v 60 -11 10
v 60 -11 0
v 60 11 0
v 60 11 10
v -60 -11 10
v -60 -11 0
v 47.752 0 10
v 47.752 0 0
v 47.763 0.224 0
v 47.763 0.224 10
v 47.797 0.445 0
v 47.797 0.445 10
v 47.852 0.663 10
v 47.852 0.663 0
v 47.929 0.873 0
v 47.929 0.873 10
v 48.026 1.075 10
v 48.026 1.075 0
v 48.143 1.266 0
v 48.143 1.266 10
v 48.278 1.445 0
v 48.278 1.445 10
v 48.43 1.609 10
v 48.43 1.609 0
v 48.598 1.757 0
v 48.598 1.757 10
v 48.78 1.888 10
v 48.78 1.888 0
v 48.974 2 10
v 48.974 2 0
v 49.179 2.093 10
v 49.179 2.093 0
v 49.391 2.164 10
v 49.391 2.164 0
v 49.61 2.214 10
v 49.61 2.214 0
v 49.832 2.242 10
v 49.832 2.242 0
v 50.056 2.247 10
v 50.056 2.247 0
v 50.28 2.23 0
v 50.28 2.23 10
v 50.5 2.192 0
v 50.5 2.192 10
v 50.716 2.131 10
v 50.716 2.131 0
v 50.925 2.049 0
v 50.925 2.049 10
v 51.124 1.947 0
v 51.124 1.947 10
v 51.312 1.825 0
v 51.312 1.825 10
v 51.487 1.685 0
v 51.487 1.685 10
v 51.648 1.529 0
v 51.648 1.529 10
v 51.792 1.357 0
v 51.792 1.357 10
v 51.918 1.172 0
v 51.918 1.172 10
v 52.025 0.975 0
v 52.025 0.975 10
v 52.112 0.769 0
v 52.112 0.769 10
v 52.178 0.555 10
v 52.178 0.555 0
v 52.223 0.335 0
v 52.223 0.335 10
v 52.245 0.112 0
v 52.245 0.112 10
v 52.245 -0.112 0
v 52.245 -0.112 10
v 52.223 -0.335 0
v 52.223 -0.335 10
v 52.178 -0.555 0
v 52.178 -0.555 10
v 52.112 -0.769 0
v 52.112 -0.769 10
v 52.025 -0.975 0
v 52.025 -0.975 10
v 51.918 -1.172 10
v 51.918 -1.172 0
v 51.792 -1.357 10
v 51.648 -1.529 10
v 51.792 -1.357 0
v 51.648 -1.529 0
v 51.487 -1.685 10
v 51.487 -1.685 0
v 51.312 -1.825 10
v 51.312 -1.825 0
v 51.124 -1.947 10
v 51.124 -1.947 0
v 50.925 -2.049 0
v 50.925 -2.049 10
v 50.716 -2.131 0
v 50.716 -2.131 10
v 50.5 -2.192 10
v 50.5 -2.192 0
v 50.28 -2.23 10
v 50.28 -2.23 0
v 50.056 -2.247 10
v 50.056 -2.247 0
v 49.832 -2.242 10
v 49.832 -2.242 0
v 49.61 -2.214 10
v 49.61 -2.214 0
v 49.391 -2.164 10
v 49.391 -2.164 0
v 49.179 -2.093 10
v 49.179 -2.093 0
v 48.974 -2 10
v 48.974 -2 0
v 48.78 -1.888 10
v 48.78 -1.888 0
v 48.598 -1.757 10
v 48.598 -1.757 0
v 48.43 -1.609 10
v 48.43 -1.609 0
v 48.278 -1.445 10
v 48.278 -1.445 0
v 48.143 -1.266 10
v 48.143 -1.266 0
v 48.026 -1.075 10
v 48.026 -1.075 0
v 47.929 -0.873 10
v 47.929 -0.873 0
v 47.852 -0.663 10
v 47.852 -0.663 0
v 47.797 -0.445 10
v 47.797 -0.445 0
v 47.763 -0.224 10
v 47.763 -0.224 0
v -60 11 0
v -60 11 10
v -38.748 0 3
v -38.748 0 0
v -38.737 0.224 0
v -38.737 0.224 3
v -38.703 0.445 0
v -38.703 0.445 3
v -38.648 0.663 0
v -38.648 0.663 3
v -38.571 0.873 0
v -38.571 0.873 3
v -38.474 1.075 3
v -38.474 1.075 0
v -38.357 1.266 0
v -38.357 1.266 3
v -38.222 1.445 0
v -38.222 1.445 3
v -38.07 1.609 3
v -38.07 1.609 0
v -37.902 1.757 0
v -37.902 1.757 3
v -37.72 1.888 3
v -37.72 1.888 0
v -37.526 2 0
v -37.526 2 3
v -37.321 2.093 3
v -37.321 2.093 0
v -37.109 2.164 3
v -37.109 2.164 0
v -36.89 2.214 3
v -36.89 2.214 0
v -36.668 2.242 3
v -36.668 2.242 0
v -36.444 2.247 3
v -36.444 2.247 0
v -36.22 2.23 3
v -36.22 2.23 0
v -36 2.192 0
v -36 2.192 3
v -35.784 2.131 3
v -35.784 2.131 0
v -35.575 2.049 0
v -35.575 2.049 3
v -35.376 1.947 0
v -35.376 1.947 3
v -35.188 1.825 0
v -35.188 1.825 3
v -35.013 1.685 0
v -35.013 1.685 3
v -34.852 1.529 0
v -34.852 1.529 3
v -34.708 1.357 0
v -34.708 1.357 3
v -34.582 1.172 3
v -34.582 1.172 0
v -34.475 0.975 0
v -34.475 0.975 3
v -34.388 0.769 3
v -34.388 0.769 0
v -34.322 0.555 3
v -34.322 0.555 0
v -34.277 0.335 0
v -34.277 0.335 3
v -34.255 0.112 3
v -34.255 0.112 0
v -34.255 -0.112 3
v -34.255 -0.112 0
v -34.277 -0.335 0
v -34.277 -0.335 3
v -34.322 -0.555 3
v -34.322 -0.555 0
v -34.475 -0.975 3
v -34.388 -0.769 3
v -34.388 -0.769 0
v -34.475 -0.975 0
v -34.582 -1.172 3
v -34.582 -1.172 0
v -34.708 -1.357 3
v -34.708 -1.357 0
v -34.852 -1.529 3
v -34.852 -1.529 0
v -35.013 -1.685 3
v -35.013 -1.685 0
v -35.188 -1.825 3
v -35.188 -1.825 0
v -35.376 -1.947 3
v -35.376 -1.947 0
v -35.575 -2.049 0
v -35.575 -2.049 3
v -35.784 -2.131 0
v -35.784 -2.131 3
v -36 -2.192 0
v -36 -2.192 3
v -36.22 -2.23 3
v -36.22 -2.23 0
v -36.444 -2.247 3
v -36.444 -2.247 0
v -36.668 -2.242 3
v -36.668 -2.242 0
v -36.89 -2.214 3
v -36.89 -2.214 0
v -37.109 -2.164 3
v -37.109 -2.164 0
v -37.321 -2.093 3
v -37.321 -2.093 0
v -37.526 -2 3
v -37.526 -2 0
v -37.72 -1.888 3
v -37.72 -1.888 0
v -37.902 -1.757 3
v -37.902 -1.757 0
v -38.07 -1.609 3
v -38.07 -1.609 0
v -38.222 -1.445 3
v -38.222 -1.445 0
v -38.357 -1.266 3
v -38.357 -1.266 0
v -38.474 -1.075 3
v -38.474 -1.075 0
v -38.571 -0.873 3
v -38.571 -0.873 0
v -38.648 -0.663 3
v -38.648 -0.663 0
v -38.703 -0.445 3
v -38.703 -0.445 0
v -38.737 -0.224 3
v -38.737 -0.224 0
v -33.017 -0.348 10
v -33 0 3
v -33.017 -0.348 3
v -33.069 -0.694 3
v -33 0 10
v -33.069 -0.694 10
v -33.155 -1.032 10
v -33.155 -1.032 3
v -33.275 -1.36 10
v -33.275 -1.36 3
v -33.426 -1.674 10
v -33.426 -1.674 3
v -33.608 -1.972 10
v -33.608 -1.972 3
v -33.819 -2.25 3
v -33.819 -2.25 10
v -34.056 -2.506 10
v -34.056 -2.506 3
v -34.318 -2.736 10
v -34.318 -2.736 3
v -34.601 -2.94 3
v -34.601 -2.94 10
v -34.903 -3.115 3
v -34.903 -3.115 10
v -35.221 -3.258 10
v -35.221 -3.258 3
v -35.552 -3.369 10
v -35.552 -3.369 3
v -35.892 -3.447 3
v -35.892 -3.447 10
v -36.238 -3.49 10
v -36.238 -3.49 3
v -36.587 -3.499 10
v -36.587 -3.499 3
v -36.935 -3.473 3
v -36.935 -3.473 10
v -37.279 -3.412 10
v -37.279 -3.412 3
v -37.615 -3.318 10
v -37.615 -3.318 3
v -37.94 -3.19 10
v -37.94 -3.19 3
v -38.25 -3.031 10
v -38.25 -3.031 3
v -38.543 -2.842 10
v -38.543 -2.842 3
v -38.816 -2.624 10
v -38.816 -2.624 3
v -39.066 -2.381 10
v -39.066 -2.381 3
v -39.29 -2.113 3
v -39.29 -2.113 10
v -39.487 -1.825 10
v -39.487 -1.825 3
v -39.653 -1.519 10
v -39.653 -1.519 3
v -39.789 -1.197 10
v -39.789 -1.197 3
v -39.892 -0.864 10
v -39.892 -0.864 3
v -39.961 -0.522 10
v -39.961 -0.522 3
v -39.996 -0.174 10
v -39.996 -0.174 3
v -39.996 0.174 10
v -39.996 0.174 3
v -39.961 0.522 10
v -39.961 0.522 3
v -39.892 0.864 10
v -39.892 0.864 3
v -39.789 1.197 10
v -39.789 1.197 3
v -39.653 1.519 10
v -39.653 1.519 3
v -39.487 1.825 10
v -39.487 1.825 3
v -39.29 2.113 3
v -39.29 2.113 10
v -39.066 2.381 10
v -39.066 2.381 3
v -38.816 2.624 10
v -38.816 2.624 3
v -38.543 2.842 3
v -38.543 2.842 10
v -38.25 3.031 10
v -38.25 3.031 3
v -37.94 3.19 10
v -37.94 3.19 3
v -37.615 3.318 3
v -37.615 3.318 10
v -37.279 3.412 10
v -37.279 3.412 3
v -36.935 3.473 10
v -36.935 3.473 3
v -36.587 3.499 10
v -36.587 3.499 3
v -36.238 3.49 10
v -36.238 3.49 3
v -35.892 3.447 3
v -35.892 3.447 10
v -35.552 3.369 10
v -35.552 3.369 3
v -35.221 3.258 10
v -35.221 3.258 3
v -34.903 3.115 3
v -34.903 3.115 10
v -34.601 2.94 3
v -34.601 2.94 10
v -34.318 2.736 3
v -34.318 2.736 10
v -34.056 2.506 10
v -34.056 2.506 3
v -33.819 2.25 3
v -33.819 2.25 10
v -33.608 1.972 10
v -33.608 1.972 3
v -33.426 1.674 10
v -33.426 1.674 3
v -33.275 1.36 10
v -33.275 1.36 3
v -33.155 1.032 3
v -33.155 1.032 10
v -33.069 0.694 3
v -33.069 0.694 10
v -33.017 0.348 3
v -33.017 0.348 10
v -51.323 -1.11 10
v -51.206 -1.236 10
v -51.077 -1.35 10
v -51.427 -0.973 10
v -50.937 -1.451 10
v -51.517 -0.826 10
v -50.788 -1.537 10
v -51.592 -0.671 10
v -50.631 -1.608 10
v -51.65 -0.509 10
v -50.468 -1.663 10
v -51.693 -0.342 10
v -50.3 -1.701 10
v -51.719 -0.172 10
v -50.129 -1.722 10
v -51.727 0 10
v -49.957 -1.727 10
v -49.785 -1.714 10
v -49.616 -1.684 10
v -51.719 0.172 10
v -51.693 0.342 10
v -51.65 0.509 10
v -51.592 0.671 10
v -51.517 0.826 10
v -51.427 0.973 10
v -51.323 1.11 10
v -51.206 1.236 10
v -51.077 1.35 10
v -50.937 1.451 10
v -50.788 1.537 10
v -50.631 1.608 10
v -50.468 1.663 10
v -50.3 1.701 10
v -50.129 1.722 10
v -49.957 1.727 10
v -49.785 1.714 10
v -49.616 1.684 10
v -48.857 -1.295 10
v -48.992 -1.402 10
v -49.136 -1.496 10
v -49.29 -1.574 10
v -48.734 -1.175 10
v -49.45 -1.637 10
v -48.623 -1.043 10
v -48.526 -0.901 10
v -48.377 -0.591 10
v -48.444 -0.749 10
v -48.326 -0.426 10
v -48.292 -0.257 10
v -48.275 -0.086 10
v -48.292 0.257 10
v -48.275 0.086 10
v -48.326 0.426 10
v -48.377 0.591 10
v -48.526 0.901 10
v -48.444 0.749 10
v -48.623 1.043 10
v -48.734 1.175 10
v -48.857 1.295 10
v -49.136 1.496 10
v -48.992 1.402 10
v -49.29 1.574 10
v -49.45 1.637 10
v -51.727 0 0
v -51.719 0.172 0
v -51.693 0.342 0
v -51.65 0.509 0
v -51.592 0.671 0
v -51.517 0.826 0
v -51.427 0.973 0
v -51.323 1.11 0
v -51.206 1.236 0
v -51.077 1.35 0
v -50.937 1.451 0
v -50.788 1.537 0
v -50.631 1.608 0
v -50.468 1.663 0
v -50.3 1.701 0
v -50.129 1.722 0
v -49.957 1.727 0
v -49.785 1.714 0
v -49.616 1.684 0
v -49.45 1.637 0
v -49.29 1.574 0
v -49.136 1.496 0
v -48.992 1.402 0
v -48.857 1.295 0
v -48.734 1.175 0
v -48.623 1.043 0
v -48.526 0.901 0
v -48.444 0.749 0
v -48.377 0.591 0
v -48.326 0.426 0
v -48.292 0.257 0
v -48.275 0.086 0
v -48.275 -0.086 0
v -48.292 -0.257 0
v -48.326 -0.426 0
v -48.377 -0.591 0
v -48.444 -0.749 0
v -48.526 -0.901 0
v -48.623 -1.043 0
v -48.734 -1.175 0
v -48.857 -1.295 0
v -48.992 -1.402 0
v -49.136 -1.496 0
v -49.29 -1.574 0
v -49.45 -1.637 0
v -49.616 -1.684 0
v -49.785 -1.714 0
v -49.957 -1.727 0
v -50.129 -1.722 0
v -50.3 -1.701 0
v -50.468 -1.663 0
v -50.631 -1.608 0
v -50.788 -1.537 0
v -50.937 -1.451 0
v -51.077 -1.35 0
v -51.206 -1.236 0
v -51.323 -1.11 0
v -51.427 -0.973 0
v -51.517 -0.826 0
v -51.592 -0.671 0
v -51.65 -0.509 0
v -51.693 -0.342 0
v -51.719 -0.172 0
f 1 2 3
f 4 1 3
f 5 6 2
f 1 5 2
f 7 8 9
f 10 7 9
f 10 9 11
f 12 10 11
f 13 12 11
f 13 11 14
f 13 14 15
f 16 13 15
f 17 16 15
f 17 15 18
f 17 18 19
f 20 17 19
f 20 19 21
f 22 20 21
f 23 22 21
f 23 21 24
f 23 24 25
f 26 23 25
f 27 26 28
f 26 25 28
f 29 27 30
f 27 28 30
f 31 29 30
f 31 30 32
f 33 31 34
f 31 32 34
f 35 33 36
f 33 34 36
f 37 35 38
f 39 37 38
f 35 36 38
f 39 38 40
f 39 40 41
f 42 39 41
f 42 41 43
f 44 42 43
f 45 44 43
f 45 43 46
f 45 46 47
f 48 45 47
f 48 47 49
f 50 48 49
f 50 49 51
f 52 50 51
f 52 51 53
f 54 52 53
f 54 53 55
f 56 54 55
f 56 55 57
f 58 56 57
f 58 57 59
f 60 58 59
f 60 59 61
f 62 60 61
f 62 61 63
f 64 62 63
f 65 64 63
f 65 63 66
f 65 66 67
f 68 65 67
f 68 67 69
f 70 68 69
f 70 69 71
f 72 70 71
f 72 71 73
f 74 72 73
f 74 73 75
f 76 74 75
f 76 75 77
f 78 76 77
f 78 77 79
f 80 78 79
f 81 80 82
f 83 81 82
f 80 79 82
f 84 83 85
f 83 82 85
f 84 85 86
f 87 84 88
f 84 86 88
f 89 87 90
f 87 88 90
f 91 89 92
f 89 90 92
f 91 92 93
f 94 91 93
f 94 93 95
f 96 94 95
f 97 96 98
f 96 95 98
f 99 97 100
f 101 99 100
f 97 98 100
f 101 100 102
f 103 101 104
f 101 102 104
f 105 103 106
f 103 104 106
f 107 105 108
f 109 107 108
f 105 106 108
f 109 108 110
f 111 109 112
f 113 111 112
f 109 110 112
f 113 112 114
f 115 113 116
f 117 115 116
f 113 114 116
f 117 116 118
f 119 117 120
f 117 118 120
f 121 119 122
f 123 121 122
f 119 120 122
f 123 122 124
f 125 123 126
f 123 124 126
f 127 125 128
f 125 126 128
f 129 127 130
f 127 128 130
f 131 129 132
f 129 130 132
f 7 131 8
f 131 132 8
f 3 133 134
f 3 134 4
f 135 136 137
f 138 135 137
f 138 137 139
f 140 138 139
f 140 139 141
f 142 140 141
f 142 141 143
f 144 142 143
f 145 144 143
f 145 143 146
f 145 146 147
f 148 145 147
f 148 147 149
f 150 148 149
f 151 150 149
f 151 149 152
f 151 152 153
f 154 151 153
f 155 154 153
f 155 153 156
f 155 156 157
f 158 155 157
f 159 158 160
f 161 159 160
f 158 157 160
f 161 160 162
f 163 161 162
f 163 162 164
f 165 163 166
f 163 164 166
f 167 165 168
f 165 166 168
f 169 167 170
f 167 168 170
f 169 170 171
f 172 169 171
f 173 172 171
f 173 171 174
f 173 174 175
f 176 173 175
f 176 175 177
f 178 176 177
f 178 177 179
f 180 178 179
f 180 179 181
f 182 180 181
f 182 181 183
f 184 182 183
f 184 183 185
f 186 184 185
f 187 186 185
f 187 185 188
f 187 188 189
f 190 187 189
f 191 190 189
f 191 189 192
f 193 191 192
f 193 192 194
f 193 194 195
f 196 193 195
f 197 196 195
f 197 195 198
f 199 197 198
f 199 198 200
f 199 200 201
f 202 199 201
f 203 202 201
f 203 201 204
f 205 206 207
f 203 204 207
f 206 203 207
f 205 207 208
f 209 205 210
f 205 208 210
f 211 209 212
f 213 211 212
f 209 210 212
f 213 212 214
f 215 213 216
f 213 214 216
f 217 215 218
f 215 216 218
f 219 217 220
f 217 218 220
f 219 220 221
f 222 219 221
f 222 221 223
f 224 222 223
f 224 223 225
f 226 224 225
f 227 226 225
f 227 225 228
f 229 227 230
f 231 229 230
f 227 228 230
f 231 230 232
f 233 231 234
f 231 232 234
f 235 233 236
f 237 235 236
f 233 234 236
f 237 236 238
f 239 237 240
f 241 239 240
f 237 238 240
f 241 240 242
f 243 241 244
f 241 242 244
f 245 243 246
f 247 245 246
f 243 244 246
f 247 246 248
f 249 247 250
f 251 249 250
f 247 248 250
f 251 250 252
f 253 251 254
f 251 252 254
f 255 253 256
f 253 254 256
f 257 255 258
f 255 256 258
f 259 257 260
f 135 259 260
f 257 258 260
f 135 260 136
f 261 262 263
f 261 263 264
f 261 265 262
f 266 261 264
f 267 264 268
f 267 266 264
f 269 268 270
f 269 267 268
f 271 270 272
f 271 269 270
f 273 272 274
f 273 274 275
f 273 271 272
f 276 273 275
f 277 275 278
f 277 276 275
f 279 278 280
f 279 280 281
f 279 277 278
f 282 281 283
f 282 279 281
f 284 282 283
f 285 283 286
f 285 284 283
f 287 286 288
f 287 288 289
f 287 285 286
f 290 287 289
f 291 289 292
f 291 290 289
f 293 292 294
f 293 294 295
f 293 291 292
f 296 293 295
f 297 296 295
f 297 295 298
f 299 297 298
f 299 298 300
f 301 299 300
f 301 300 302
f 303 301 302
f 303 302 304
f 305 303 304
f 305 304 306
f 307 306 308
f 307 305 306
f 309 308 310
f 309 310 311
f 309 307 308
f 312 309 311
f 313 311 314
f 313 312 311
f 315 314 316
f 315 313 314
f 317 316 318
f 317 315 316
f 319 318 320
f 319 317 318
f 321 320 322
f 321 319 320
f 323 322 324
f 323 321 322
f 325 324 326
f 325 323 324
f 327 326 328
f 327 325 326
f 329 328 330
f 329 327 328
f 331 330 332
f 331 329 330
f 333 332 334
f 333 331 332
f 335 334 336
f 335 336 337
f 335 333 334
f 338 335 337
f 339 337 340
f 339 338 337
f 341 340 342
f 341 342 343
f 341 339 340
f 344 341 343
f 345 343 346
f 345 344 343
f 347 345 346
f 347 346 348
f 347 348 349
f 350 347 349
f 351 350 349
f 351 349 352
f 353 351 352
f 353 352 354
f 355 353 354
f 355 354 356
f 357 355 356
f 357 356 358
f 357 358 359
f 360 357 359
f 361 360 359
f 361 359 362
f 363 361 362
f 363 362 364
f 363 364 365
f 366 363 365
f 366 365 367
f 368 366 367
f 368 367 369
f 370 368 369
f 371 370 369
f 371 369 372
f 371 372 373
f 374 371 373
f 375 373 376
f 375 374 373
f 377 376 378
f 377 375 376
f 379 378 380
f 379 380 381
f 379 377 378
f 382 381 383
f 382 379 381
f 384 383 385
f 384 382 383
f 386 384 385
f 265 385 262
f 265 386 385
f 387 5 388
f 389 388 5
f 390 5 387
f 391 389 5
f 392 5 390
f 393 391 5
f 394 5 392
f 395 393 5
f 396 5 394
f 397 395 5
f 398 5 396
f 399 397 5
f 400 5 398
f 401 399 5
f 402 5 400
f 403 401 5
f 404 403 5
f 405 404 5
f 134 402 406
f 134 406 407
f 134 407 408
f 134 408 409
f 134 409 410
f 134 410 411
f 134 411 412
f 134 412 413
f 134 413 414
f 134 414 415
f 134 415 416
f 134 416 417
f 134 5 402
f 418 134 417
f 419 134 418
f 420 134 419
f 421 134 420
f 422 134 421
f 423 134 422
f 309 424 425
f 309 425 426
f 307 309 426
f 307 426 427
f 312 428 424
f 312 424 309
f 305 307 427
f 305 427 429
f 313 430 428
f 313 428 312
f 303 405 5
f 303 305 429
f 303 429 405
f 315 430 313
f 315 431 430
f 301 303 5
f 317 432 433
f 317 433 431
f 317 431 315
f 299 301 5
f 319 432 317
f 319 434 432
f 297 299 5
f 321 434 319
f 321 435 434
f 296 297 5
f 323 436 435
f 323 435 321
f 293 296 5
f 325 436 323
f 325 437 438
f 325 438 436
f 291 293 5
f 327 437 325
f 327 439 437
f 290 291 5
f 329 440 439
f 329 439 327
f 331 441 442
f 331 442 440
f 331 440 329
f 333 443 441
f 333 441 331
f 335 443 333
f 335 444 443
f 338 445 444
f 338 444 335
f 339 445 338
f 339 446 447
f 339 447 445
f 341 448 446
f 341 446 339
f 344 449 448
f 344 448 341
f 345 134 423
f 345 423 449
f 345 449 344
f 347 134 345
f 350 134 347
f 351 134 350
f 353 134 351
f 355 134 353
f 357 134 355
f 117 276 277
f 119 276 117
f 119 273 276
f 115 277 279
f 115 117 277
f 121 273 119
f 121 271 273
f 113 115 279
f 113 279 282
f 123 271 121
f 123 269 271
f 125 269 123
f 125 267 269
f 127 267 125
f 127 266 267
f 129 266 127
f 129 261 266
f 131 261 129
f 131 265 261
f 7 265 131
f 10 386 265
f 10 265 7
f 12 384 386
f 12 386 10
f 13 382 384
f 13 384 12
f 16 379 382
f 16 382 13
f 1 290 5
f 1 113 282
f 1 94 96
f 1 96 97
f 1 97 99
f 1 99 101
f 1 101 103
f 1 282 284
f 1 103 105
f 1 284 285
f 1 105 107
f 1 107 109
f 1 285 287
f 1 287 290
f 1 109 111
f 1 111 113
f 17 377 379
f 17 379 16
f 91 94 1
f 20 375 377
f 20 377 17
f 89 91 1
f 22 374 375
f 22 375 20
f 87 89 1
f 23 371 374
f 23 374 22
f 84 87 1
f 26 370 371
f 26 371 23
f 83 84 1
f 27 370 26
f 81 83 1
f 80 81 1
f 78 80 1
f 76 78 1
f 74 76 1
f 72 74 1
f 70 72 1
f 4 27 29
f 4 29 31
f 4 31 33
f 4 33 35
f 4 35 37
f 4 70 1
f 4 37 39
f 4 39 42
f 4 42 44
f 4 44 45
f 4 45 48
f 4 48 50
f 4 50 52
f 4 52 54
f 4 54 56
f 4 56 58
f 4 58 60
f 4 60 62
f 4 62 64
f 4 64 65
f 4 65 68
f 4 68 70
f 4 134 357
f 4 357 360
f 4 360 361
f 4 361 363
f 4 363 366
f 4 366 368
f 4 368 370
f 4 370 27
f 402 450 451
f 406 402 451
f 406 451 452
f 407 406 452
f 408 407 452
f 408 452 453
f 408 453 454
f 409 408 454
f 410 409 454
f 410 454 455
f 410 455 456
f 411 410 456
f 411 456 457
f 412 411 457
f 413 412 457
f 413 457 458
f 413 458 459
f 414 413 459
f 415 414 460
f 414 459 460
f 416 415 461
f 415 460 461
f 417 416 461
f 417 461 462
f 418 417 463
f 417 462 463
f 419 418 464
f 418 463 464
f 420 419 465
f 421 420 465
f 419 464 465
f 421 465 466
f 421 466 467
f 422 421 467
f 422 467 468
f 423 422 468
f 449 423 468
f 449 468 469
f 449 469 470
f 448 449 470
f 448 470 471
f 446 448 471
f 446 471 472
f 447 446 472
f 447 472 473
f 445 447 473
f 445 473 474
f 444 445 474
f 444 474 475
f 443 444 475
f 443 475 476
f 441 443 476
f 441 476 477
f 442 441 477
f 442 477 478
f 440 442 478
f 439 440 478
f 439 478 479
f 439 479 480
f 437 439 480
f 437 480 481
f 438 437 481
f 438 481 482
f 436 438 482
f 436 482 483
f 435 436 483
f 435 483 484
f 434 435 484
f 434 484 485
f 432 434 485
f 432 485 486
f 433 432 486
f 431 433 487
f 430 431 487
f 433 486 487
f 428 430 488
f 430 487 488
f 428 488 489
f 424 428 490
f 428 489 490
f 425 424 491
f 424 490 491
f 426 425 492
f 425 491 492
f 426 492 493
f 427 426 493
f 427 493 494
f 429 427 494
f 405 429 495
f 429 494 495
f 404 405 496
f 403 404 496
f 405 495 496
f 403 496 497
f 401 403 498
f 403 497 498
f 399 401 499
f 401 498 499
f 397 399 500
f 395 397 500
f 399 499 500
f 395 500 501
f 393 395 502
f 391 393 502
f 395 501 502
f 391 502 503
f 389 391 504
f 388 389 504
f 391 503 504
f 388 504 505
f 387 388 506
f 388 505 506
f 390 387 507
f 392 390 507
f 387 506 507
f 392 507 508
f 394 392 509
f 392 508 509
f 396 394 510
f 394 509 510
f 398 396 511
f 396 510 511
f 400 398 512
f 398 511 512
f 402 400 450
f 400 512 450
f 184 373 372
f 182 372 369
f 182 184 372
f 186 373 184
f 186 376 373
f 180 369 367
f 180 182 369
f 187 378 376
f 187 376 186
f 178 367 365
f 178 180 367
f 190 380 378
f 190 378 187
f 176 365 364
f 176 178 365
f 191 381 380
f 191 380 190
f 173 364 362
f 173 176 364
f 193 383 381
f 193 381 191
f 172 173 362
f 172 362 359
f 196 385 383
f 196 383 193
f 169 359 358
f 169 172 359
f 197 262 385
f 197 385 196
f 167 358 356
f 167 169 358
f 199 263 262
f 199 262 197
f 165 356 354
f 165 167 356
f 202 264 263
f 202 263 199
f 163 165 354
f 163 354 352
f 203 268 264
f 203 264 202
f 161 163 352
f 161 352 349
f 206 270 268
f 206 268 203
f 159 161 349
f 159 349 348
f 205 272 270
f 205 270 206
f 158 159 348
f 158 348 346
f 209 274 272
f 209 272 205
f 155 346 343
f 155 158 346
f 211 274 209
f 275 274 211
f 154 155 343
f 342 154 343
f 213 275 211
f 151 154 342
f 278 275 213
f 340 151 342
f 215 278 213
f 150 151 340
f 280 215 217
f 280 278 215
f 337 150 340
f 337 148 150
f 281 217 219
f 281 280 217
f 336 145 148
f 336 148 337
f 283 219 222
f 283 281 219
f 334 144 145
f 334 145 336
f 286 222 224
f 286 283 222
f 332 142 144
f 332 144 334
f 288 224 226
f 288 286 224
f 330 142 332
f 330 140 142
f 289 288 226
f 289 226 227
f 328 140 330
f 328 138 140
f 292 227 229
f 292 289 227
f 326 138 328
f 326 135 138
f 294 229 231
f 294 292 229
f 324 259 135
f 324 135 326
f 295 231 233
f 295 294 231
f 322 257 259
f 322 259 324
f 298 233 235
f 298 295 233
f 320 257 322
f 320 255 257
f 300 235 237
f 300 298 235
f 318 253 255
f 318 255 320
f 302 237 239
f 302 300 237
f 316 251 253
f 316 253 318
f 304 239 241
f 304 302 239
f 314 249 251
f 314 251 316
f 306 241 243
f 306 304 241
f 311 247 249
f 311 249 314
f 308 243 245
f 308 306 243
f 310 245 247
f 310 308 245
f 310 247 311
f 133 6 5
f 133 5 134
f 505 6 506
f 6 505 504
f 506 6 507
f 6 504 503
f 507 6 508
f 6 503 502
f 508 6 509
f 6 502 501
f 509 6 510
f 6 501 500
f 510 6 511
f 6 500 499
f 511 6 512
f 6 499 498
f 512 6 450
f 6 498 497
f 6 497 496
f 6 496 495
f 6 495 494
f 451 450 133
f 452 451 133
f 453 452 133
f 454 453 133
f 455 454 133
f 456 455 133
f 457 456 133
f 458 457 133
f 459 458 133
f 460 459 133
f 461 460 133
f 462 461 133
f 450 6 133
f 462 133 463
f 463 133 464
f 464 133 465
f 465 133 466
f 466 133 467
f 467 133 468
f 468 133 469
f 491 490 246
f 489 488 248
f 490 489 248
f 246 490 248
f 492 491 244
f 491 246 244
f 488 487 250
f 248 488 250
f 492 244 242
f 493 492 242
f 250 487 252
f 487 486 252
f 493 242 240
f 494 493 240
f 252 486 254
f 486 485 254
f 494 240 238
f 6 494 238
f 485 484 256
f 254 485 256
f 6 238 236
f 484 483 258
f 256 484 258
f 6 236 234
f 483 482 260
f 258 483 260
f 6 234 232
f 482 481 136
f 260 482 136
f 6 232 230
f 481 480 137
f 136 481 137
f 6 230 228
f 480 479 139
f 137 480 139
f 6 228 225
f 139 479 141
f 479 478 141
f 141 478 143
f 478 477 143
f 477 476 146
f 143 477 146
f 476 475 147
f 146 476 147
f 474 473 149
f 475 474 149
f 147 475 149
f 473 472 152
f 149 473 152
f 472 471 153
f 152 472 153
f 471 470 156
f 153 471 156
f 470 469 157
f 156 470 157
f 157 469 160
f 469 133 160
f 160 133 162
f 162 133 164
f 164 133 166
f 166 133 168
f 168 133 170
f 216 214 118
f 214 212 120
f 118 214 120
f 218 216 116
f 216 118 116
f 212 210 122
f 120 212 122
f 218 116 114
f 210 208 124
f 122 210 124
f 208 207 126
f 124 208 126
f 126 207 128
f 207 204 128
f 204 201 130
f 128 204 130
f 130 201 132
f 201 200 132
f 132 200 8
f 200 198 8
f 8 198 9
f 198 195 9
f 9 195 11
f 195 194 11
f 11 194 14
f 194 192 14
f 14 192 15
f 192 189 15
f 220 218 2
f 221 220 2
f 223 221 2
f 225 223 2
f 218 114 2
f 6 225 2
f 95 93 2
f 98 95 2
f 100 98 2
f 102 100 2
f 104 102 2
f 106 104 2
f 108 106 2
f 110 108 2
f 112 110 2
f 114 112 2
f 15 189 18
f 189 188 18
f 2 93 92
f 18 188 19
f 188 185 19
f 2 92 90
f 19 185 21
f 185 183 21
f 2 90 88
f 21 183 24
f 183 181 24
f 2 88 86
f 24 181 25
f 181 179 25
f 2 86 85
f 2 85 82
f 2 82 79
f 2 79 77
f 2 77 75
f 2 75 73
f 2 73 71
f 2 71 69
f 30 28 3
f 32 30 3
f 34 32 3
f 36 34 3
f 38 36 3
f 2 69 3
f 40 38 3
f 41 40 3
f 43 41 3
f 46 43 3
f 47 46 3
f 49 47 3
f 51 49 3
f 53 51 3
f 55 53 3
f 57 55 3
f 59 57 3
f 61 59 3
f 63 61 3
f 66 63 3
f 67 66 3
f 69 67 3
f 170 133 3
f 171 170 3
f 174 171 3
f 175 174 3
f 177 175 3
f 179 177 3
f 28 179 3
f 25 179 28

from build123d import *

# Parameters (mm, degrees)
F0_W     = 120
F0_H     = 22
F1_DEPTH = 10
F3_D     = 3.4544
F5_D     = 4.4958
F6_W     = 2.5
F6_H     = 7


with BuildPart() as f1:
    # F0 (on Top) → F1 (new body)
    with BuildSketch(Plane.XY):
        Rectangle(F0_W, F0_H)
    extrude(amount=F1_DEPTH)

    # F3 (through all)
    with Locations(Plane.XY.offset(10)):
        with Locations((-50, 0)):
            Hole(F3_D / 2)

    # F5 (through all)
    with Locations(Plane.XY.offset(10)):
        with Locations((-36.5, 0), (50, 0)):
            Hole(F5_D / 2)

    # F6 (on Front) → F7 (revolve, cut)
    with BuildSketch(Plane.XZ):
        with Locations((-34.25, 6.5)):
            Rectangle(F6_W, F6_H)
    revolve(axis=Axis((-36.5, 0, 5), (0, 0, -1)), mode=Mode.SUBTRACT)


solid = f1.part
